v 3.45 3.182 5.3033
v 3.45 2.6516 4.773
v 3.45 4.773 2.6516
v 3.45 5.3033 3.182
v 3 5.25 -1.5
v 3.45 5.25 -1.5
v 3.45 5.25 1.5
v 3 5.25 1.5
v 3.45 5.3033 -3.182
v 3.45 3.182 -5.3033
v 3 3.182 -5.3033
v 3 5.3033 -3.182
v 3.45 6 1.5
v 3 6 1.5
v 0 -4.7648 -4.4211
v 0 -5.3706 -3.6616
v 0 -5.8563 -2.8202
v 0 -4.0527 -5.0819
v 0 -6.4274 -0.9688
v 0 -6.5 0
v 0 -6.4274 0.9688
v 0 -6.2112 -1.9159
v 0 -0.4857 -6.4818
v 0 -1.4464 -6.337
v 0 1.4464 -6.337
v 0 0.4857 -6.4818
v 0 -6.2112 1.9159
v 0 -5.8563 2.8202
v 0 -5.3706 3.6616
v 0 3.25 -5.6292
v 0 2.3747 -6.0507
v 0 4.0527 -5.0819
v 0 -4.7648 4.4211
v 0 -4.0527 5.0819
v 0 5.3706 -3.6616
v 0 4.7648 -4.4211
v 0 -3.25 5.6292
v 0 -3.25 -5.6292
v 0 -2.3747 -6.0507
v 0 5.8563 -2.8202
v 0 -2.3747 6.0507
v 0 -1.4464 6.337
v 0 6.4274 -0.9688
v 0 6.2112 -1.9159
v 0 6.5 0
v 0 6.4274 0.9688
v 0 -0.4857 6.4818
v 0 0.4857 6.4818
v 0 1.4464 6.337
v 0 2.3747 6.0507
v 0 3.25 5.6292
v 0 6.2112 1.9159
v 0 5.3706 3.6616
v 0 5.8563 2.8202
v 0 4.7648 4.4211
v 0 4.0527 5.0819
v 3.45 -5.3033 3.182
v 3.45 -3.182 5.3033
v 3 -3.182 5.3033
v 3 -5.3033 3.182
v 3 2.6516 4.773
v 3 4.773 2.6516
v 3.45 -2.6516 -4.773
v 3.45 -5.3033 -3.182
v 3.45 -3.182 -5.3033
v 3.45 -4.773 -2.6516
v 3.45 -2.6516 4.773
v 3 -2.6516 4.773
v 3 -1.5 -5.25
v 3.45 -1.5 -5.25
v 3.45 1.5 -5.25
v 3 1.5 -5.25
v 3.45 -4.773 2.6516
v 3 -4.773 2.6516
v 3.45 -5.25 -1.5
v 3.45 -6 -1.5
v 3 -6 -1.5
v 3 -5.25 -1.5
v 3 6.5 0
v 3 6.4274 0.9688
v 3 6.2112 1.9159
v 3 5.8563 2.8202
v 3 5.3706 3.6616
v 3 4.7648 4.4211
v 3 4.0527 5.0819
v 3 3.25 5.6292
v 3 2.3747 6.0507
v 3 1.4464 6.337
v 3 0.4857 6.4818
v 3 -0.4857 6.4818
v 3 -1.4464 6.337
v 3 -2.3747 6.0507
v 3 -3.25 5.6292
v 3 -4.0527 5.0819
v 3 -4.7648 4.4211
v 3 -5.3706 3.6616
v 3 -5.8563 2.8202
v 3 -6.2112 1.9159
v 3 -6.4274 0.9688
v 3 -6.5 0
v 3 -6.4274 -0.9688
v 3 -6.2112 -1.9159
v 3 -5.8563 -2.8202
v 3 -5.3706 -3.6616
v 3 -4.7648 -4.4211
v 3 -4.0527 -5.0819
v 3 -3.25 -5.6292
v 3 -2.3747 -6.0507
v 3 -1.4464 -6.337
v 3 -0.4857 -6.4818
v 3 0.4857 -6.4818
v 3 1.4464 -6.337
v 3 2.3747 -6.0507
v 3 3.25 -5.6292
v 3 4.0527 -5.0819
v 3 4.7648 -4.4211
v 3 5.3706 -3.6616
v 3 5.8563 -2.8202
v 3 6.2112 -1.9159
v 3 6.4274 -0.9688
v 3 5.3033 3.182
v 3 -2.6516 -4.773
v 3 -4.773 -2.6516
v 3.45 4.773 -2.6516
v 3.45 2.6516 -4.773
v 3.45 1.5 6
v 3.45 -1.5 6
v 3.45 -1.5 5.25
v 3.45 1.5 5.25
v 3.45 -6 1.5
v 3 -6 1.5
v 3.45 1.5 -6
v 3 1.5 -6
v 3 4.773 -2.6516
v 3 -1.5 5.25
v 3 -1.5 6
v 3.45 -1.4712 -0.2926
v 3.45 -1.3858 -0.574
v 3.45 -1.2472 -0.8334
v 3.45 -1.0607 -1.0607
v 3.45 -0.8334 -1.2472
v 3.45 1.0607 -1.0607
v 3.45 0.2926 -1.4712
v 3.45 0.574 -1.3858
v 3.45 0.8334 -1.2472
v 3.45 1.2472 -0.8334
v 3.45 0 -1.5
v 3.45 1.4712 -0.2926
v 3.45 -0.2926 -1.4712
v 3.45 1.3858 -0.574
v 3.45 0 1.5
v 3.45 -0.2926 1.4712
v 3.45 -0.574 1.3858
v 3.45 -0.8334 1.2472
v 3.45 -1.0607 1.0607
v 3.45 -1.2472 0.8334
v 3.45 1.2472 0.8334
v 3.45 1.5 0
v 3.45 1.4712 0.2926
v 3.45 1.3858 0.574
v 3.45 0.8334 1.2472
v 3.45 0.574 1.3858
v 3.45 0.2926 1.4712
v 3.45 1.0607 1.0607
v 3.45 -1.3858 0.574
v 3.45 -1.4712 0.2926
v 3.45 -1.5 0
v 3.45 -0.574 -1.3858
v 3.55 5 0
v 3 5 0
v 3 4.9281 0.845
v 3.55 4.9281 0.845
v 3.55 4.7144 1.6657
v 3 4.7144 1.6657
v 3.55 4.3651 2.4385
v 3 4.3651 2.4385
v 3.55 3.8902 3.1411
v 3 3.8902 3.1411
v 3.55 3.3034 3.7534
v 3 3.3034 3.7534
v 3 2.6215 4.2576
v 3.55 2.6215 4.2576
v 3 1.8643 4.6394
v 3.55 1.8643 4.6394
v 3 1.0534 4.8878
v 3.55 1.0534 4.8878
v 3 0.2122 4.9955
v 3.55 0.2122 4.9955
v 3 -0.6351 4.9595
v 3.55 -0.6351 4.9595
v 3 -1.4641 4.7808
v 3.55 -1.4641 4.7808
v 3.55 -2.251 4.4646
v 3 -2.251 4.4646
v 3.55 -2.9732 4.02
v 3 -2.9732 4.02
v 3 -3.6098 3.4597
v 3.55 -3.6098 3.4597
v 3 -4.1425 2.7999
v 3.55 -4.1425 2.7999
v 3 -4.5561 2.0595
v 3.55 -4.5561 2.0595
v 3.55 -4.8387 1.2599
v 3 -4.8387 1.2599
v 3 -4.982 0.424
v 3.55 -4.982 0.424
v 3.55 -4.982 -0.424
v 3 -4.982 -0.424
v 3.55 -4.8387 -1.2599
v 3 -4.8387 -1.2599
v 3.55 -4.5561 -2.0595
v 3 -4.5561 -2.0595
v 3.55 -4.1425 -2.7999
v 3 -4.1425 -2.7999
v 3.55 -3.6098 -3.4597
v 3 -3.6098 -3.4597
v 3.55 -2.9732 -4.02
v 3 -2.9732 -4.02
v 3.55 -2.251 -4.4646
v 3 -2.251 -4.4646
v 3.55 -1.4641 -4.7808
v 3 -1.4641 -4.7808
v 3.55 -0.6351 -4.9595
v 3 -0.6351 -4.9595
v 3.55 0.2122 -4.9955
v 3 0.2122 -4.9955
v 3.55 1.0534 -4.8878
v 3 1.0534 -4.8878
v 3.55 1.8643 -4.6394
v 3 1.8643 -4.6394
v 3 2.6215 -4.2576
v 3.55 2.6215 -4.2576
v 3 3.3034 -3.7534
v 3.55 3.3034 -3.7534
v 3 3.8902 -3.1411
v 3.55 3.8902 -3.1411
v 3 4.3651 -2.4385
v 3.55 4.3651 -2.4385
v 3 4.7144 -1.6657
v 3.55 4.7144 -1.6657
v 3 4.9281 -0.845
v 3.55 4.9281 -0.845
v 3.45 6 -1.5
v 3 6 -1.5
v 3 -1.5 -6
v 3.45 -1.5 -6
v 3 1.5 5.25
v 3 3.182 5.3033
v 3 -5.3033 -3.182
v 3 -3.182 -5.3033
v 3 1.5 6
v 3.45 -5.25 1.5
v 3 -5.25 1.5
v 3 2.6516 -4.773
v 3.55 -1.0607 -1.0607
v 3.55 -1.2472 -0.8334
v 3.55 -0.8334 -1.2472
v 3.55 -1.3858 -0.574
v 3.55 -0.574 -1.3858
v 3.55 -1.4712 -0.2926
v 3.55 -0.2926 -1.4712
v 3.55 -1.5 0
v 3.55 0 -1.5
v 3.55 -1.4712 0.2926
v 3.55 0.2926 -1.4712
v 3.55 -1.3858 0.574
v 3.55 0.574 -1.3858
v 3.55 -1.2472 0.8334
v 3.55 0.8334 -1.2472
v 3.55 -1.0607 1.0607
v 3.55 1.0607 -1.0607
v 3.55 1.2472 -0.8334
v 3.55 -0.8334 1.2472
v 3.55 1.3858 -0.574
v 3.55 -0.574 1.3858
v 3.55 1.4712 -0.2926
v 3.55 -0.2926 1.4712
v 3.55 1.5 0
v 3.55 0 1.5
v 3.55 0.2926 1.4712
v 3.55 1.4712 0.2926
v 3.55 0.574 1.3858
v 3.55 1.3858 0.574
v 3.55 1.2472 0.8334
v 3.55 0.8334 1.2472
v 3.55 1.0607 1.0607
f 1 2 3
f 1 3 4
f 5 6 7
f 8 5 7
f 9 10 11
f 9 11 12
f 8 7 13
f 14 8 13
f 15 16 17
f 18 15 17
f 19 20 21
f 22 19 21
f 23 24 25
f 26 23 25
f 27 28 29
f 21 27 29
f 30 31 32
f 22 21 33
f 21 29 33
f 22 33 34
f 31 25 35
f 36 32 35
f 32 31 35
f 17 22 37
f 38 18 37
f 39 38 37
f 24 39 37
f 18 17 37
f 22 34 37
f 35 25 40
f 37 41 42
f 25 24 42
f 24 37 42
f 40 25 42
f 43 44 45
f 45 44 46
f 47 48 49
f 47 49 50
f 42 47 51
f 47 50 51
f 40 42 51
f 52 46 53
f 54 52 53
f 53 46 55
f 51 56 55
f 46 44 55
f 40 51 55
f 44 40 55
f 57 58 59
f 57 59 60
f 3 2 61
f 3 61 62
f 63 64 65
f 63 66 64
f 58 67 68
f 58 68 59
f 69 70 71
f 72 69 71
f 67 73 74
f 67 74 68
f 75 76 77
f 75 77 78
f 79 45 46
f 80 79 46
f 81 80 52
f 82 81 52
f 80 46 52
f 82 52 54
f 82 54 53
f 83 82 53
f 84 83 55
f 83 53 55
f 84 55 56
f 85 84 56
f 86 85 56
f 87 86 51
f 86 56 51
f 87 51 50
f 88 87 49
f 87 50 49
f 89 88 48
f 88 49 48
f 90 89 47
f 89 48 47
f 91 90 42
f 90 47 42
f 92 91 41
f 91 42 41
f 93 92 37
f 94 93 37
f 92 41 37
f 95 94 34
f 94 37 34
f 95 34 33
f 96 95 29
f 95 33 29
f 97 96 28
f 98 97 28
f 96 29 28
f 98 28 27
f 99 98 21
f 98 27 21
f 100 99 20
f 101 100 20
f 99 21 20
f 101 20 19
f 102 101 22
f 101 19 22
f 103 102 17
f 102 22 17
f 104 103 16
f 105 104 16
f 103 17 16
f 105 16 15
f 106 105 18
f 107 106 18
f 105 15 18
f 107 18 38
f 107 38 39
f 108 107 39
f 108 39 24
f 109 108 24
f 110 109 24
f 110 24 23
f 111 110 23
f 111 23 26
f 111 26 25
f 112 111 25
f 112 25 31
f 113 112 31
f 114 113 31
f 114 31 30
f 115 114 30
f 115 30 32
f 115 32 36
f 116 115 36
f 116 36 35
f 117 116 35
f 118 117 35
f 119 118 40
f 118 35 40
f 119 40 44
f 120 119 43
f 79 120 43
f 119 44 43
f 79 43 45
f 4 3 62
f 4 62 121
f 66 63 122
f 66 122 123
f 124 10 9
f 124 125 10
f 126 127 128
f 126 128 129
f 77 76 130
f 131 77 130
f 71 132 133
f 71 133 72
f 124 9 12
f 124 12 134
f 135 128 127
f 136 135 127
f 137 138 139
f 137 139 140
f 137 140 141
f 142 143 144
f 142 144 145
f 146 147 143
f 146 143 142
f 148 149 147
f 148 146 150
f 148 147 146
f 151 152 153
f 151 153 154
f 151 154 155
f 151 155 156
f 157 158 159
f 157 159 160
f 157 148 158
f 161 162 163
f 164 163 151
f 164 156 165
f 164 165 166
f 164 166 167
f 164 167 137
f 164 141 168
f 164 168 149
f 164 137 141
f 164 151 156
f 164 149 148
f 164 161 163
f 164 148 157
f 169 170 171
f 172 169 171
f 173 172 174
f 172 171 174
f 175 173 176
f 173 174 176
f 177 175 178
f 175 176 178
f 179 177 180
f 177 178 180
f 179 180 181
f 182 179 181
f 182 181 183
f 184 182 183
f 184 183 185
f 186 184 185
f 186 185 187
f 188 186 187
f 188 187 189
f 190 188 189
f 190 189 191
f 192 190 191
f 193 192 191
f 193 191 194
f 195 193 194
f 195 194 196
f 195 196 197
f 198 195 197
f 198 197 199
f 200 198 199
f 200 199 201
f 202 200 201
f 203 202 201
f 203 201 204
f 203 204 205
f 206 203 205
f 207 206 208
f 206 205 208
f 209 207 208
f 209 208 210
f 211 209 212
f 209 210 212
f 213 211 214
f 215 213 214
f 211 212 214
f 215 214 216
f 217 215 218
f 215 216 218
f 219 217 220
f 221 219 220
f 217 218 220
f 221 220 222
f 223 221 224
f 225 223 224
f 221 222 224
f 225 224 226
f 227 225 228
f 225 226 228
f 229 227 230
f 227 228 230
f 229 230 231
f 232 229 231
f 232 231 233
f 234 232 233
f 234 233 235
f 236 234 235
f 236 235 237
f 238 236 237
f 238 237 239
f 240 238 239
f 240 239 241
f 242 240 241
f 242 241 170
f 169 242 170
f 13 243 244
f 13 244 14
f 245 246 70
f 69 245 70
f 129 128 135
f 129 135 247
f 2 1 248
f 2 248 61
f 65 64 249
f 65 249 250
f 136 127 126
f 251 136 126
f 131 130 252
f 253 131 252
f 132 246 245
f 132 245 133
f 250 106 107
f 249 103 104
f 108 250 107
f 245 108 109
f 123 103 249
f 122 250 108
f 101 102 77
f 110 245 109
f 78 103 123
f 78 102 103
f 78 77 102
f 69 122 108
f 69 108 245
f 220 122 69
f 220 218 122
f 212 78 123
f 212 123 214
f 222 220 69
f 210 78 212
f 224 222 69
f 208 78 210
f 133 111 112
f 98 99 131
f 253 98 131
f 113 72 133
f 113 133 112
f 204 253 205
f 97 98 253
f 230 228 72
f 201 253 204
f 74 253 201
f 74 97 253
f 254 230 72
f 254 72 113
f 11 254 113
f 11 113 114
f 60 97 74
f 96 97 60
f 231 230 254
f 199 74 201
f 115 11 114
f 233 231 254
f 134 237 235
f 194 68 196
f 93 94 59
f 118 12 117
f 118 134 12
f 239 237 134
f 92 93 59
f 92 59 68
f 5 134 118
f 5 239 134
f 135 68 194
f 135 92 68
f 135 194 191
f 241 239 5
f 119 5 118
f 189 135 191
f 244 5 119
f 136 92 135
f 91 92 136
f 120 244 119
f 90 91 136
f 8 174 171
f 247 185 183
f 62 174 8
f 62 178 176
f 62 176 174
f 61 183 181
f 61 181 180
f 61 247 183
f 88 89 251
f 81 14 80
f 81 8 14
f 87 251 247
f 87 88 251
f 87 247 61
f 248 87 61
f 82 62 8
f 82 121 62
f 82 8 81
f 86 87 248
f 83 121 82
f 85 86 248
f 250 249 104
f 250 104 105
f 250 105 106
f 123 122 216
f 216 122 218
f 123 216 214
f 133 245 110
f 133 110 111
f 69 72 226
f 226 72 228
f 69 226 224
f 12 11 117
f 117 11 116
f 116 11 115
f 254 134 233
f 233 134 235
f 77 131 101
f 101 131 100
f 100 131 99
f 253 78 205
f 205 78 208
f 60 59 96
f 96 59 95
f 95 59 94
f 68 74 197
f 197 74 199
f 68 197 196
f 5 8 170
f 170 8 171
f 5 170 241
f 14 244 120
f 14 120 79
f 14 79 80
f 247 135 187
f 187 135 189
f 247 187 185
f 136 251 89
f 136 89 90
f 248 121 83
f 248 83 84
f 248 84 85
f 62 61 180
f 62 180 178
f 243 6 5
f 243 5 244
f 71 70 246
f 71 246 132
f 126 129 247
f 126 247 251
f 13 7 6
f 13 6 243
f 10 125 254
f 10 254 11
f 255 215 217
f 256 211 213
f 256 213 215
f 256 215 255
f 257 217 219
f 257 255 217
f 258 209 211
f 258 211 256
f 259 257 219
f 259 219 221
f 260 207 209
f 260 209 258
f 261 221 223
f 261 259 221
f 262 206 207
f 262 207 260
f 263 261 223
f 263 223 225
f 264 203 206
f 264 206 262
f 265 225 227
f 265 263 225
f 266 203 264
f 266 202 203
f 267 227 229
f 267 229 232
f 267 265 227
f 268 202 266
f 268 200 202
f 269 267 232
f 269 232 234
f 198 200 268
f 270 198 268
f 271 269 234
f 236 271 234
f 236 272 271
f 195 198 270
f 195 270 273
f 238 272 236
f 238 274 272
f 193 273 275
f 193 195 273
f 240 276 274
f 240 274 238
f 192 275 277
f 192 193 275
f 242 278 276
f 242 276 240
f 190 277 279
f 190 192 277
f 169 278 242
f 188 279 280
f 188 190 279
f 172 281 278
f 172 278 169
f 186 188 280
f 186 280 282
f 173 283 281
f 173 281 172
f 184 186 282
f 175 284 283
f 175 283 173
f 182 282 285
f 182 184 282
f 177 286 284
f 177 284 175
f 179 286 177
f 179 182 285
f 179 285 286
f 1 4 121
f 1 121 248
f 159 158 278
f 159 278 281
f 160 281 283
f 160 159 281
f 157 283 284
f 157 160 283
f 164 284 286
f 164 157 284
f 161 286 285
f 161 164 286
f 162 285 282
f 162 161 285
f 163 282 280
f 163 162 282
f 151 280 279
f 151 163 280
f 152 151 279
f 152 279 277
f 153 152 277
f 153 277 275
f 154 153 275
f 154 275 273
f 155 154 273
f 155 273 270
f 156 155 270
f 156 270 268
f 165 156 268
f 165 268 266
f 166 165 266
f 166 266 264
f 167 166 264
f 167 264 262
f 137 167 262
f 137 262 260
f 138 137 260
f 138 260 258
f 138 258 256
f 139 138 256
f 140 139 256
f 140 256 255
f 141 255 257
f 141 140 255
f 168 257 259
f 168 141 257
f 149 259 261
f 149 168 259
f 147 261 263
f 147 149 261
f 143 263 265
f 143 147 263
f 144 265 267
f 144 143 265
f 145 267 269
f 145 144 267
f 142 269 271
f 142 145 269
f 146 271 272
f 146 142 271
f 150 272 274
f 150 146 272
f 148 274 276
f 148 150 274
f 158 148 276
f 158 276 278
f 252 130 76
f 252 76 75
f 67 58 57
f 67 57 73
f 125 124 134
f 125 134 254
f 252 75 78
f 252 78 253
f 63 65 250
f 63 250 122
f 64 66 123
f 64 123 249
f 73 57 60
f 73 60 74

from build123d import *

# Parameters (mm, degrees)
F0_R     = 6.5
F0_R_2   = 5
F0_R_3   = 1.5
F1_DEPTH = 3
F2_DEPTH = 3.55
F3_DEPTH = 3.45
F4_W     = 3
F4_H     = 0.75
F4_W_2   = 0.75
F4_H_2   = 3
F5_DEPTH = 0.45


with BuildPart() as f1:
    # F0 (on Right) → F1 (new body)
    with BuildSketch(Plane.YZ):
        Circle(F0_R)
        Circle(F0_R_2, mode=Mode.SUBTRACT)
        Circle(F0_R_2)
        Circle(F0_R_3, mode=Mode.SUBTRACT)
        Circle(F0_R_3)
    extrude(amount=F1_DEPTH)

    # F0 (on Right) → F2 (join)
    with BuildSketch(Plane.YZ):
        Circle(F0_R_2)
        Circle(F0_R_3, mode=Mode.SUBTRACT)
    extrude(amount=F2_DEPTH)

    # F0 (on Right) → F3 (join)
    with BuildSketch(Plane.YZ):
        Circle(F0_R_3)
    extrude(amount=F3_DEPTH)

    # F4 (on face) → F5 (join, through all)
    with BuildSketch(Plane.YZ.offset(3.45)):
        with Locations((0, 5.625)):
            Rectangle(F4_W, F4_H)
        Polygon((5.303301, 3.181981), (3.181981, 5.303301), (2.65165, 4.772971), (4.772971, 2.65165), align=None)
        with Locations((5.625, 0)):
            Rectangle(F4_W_2, F4_H_2)
        Polygon((3.181981, -5.303301), (5.303301, -3.181981), (4.772971, -2.65165), (2.65165, -4.772971), align=None)
        with Locations((0, -5.625)):
            Rectangle(F4_W, F4_H)
        Polygon((-5.303301, -3.181981), (-3.181981, -5.303301), (-2.65165, -4.772971), (-4.772971, -2.65165), align=None)
        with Locations((-5.625, 0)):
            Rectangle(F4_W_2, F4_H_2)
        Polygon((-3.181981, 5.303301), (-5.303301, 3.181981), (-4.772971, 2.65165), (-2.65165, 4.772971), align=None)
    extrude(amount=-F5_DEPTH)


solid = f1.part
